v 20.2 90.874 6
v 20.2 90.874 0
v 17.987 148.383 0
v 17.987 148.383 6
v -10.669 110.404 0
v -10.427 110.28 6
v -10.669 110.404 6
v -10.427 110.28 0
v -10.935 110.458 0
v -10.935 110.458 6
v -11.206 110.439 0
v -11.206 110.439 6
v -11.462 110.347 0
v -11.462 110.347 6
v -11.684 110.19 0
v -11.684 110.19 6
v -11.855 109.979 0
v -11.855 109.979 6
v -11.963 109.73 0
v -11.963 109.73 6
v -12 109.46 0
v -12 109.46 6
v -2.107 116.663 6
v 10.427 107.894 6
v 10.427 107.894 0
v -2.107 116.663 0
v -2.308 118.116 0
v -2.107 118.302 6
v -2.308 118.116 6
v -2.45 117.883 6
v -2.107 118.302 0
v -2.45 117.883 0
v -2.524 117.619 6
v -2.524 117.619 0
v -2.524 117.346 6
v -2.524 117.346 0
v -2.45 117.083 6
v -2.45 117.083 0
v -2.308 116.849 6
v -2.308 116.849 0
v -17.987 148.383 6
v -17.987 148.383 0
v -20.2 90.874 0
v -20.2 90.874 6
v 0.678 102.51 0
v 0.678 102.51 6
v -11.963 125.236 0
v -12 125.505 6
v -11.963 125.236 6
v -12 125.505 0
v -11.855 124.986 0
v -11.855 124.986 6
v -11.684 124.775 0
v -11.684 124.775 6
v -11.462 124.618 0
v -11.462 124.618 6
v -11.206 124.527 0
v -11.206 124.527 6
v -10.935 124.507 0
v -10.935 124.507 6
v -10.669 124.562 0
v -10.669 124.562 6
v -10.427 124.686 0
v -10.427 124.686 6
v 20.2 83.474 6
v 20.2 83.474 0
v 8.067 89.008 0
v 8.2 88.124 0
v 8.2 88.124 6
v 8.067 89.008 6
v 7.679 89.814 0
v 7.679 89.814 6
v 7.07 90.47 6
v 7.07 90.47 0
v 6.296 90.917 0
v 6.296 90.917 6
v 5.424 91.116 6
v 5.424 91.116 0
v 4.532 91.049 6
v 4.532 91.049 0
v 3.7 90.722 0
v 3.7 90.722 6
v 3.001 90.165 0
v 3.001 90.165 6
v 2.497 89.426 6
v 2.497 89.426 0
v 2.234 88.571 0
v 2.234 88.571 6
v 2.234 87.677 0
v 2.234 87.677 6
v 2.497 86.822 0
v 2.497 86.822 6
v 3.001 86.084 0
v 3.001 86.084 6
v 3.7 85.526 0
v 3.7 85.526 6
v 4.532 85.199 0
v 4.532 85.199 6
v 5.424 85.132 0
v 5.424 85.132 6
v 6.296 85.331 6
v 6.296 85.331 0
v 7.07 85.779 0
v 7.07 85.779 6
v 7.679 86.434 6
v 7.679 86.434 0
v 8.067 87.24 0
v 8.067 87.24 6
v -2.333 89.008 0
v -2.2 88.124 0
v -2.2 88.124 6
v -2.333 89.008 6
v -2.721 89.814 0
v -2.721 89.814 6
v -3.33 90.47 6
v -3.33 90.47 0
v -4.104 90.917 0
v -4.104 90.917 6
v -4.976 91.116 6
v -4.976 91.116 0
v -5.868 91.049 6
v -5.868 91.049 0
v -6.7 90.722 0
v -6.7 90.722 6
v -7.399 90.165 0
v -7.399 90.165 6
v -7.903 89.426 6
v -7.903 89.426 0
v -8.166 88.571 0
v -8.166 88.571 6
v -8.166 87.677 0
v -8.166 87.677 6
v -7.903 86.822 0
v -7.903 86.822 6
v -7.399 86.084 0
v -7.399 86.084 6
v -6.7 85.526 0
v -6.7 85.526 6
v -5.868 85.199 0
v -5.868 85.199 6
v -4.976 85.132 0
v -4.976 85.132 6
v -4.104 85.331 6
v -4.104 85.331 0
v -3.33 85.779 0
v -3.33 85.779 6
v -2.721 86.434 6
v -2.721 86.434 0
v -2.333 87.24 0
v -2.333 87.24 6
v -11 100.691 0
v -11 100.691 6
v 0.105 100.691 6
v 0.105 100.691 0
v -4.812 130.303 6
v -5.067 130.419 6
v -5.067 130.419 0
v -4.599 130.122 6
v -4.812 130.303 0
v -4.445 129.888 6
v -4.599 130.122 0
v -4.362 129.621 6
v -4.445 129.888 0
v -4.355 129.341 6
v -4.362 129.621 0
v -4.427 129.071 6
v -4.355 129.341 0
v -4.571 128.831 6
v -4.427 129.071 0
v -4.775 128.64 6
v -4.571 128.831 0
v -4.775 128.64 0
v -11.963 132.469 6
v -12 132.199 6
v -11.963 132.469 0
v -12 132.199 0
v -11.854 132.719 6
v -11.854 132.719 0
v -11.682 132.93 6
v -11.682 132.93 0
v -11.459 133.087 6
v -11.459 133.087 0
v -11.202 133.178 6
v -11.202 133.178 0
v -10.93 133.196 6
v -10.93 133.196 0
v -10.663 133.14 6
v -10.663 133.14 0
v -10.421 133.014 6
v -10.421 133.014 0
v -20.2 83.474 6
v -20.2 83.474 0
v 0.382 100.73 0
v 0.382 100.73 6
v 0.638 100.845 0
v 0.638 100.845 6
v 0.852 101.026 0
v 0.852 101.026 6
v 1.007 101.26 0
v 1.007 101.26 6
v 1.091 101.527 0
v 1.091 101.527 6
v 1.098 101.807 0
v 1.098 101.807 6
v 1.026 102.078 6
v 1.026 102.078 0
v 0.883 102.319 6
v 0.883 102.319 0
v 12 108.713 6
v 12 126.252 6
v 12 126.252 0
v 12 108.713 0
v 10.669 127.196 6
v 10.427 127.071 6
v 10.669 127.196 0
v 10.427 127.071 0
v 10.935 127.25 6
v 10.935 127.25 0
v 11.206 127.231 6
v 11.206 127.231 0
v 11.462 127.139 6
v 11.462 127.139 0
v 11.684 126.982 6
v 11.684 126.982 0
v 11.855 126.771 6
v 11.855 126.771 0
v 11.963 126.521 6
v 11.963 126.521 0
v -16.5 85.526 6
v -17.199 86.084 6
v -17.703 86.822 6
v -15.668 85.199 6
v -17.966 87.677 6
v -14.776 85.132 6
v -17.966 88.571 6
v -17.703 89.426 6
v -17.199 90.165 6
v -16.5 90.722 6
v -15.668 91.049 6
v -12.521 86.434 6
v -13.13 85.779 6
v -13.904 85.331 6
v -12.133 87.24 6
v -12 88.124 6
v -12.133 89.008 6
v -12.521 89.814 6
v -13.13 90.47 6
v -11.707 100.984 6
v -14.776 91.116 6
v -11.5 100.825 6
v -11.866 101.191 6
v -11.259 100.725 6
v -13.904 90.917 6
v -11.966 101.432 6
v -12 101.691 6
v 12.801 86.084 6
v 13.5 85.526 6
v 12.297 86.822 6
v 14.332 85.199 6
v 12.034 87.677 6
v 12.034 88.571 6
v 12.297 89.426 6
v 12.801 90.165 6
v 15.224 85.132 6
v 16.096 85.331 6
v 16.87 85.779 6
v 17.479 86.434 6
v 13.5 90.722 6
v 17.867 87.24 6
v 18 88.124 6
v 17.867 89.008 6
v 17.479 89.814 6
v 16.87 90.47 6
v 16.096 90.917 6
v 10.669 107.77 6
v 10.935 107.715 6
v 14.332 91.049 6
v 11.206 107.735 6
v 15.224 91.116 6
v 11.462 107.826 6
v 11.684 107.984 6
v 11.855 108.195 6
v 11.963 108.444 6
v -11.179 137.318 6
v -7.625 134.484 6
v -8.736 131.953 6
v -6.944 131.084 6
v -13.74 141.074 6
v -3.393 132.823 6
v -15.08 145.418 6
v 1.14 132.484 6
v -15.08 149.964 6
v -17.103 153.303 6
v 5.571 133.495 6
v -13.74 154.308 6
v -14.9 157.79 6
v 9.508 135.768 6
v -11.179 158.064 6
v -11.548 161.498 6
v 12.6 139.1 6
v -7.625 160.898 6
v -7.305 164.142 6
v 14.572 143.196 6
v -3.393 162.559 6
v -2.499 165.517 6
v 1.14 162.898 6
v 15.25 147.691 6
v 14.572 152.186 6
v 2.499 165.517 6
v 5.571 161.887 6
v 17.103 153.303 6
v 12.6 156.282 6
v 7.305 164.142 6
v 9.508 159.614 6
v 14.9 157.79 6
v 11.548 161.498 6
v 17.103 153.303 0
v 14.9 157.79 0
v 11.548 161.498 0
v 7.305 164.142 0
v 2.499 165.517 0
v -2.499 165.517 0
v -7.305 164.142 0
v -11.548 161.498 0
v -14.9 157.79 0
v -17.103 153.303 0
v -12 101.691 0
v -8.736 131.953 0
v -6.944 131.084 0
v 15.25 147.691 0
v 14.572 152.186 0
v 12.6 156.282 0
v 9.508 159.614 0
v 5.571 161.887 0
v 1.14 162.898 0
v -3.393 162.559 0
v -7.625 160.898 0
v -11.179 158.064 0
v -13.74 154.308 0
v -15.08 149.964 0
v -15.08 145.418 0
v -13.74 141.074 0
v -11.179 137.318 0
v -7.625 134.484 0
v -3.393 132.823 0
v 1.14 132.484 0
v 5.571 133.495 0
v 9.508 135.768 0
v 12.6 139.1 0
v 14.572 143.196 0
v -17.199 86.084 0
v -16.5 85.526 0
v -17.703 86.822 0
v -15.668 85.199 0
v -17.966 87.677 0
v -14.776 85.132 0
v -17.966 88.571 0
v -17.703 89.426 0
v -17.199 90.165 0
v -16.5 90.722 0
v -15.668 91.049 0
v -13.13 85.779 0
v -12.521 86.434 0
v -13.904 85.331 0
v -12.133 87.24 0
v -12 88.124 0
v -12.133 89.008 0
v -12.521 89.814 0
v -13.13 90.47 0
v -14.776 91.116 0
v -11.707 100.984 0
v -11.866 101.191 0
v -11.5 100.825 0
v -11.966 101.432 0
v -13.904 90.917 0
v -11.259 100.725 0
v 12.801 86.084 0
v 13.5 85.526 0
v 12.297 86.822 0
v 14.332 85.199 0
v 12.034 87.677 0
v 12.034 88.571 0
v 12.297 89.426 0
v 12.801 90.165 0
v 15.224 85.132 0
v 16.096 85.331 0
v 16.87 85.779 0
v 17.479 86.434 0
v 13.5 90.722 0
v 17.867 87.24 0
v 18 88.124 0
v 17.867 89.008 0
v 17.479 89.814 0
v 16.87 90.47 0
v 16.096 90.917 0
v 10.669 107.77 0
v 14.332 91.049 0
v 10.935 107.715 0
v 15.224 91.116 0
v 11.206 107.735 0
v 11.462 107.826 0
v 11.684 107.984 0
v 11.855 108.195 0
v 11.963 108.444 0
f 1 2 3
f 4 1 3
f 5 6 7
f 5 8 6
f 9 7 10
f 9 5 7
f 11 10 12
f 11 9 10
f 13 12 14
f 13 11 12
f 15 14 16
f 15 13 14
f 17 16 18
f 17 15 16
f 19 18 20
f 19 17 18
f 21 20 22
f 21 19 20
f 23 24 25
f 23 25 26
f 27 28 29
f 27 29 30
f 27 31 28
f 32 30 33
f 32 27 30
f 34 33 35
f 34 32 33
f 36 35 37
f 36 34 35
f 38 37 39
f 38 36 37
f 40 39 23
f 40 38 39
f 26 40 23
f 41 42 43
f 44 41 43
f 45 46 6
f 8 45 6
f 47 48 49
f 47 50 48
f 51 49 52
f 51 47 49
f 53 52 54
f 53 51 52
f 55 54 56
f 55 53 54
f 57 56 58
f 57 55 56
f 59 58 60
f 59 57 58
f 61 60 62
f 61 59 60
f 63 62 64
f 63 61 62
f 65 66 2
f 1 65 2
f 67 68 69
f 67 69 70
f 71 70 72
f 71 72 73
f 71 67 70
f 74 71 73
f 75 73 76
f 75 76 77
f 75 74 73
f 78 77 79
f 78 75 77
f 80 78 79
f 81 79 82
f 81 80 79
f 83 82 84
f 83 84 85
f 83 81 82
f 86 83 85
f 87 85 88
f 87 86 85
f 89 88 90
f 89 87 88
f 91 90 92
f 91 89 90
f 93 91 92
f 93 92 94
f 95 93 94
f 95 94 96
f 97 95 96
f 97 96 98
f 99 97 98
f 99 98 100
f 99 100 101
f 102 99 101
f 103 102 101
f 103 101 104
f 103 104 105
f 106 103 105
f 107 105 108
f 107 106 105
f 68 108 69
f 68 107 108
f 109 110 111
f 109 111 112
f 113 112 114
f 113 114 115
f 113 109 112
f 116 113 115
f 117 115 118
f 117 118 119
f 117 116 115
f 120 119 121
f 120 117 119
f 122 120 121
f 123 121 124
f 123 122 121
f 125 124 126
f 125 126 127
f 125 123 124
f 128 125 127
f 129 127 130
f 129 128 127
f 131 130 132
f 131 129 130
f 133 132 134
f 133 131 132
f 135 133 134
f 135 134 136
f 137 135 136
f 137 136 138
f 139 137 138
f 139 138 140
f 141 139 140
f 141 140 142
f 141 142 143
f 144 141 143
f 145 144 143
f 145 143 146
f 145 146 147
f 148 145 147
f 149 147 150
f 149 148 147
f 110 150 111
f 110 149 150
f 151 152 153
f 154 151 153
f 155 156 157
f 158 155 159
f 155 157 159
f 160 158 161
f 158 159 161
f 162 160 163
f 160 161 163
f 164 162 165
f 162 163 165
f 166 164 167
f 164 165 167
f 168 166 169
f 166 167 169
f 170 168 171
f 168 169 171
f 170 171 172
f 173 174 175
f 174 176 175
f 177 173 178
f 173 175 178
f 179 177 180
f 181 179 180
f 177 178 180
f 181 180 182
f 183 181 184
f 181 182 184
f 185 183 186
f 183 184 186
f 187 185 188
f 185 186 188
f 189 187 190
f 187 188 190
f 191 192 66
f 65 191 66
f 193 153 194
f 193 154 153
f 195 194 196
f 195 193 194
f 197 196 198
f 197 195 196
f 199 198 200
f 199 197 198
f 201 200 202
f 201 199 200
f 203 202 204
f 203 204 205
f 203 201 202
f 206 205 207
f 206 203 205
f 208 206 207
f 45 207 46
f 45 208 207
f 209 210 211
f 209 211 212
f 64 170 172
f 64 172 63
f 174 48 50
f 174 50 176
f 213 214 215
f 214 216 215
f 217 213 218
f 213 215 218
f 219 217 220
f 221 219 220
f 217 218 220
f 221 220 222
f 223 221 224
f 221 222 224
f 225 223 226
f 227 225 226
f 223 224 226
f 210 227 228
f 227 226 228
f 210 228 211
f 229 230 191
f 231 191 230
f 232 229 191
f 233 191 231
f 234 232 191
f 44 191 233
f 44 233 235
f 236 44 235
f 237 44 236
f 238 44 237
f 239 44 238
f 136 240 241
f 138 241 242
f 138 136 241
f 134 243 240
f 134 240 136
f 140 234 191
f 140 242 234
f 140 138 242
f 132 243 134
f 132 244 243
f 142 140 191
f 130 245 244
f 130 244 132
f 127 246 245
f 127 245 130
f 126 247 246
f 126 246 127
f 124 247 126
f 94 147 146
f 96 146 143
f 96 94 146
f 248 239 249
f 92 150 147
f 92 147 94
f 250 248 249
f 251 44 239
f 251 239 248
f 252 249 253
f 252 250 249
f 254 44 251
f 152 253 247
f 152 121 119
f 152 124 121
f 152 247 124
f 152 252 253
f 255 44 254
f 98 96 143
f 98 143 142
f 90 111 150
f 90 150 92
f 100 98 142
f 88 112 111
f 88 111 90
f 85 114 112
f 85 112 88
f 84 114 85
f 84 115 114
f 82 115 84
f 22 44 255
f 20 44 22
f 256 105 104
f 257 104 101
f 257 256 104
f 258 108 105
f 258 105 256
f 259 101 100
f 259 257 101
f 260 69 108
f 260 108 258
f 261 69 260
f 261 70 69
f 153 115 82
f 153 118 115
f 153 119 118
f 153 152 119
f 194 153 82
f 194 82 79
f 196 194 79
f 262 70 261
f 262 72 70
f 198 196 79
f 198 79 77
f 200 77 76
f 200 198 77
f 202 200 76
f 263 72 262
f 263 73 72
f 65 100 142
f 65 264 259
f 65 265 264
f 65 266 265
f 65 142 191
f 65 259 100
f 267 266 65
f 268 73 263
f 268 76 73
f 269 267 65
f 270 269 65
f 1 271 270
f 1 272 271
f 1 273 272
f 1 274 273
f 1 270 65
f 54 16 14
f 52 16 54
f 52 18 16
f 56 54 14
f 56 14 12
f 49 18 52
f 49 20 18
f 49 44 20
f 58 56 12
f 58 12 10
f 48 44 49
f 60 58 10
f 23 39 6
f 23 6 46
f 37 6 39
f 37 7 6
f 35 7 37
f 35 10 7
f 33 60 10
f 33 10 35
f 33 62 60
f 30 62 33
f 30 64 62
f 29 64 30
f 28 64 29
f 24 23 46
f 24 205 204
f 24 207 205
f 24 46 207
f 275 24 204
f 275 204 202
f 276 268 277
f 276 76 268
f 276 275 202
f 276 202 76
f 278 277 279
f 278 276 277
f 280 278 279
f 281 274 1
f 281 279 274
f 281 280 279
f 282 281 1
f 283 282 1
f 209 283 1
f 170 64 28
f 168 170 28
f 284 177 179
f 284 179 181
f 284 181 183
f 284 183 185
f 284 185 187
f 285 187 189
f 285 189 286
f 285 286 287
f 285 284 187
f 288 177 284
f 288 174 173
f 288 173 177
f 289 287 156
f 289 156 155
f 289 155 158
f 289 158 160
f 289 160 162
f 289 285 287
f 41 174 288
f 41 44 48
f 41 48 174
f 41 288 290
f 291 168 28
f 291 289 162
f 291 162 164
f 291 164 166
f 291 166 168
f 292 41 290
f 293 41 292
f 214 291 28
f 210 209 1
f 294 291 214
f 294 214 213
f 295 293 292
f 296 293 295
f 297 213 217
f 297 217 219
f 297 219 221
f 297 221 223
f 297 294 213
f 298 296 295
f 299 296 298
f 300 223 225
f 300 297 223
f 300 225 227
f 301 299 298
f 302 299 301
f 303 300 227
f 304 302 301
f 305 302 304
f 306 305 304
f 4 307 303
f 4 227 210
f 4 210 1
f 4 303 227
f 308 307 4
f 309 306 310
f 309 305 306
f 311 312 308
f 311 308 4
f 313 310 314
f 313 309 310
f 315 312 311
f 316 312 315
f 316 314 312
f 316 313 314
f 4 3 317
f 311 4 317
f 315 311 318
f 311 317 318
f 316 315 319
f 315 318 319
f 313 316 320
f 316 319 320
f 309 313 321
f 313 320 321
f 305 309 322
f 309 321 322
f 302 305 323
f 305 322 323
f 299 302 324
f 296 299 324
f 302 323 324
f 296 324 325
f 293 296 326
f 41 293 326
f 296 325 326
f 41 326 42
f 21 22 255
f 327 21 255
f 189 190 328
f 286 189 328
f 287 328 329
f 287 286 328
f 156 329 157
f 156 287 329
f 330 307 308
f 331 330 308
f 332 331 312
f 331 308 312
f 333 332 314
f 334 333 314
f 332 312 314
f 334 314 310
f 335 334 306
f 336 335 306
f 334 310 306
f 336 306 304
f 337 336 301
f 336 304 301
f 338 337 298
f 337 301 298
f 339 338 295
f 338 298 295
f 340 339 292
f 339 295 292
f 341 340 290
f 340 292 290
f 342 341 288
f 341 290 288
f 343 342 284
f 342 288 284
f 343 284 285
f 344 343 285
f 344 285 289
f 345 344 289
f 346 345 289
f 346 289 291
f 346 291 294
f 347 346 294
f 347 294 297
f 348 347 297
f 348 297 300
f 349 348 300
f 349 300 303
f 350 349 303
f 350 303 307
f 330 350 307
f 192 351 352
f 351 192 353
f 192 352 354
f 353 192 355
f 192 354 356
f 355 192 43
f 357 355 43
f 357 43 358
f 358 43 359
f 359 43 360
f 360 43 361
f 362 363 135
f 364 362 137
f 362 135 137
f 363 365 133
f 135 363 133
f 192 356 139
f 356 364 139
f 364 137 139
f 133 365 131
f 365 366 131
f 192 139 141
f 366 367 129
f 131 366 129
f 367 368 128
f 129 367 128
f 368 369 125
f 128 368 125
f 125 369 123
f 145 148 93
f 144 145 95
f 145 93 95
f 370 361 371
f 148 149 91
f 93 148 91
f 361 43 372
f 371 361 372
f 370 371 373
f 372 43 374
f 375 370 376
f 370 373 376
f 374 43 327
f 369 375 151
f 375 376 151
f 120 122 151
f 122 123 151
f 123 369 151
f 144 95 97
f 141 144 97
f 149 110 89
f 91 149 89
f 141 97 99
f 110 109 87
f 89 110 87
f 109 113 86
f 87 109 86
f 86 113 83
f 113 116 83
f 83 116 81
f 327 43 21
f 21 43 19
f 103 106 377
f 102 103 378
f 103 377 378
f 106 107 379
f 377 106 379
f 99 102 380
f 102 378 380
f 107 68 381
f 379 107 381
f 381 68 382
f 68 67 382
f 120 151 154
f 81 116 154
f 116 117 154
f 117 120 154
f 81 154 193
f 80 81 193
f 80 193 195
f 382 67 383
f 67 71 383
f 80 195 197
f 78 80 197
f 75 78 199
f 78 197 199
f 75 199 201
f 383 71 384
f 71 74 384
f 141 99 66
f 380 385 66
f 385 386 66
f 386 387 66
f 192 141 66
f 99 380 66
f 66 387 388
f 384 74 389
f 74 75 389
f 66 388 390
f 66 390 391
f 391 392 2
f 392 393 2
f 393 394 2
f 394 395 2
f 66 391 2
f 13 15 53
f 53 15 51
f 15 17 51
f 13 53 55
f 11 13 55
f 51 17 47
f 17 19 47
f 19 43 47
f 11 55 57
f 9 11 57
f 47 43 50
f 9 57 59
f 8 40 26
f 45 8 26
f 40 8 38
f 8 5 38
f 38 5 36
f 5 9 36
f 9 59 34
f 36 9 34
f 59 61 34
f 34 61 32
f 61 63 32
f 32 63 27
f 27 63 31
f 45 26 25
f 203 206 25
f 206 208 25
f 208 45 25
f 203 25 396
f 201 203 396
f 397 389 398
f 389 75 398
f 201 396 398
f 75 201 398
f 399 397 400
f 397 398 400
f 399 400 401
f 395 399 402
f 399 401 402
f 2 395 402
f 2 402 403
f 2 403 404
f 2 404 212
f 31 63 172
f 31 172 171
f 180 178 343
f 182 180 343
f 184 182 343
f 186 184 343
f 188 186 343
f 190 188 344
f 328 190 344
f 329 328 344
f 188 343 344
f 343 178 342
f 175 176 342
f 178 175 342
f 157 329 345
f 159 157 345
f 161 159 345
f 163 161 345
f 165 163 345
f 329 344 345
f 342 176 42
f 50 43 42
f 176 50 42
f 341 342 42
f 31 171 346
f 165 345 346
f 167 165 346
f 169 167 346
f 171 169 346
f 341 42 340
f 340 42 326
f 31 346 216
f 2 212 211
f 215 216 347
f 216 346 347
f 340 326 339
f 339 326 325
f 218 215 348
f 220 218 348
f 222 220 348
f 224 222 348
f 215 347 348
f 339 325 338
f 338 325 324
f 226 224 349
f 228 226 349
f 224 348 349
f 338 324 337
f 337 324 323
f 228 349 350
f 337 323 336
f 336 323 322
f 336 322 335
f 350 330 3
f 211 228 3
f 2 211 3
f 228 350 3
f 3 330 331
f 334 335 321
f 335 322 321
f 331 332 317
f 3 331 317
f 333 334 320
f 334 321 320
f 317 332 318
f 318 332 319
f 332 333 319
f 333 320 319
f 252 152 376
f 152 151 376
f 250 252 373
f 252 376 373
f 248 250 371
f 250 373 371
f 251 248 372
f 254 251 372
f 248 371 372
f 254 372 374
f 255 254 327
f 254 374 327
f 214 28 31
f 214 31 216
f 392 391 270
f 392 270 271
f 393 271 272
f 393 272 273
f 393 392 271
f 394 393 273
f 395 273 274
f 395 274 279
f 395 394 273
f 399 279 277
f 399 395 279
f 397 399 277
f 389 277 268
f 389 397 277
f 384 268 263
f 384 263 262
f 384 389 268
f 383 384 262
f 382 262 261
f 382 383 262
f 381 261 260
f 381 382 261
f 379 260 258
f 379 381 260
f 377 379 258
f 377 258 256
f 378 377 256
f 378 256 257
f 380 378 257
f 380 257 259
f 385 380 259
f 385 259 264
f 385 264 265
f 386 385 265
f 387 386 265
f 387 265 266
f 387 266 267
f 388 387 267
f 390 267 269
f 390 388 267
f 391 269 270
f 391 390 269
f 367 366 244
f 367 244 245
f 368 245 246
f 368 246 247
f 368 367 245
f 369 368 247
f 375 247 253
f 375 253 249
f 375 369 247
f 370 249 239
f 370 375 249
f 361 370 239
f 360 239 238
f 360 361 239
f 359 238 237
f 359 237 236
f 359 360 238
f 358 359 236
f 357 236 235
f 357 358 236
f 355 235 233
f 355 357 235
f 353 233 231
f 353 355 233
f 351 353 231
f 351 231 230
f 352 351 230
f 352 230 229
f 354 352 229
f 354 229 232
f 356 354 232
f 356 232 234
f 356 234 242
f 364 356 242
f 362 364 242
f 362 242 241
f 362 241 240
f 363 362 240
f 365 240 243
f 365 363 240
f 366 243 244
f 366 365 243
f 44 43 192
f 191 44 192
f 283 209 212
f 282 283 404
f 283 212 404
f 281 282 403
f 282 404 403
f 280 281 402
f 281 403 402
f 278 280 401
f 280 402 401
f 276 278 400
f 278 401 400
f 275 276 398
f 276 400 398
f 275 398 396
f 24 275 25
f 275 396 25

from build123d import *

# Parameters (mm, degrees)
SKETCH1_R               = 3
SKETCH1_R_2             = 7.95
MAIN_BODY_LINK_B1_DEPTH = 6
CUT_EXTRUDE1_REACH      = 169.025
CUT_EXTRUDE2_REACH      = 169.025
SKETCH3_R               = 1.5
FILLET1_R               = 1
SKETCH4_R               = 15.25
CUT_EXTRUDE3_DEPTH      = 168.02546447


with BuildPart() as part:
    # Sketch1 → Main Body Link B1 (new body)
    with BuildSketch(Plane.XY):
        with BuildLine():
            Line((-11.1, 83.474052381), (-9.1, 83.474052381))
            Line((-9.1, 83.474052381), (0, 83.474052381))
            Line((0, 83.474052381), (9.1, 83.474052381))
            Line((9.1, 83.474052381), (11.1, 83.474052381))
            Line((11.1, 83.474052381), (20.2, 83.474052381))
            Line((20.2, 83.474052381), (20.2, 90.874052381))
            Line((20.2, 90.874052381), (17.986683974, 148.383116621))
            ThreePointArc((17.986683974, 148.383116621), (0, 165.690874165), (-17.986683974, 148.383116621))
            Line((-17.986683974, 148.383116621), (-20.2, 90.874052381))
            Line((-20.2, 90.874052381), (-20.2, 83.474052381))
            Line((-20.2, 83.474052381), (-11.1, 83.474052381))
        make_face()
        with Locations((5.2, 88.124052381)):
            Circle(SKETCH1_R, mode=Mode.SUBTRACT)
        with Locations((15, 88.124052381)):
            Circle(SKETCH1_R, mode=Mode.SUBTRACT)
        with Locations((-15, 88.124052381)):
            Circle(SKETCH1_R, mode=Mode.SUBTRACT)
        with Locations((-5.2, 88.124052381)):
            Circle(SKETCH1_R, mode=Mode.SUBTRACT)
        with Locations((0, 147.690874165)):
            Circle(SKETCH1_R_2, mode=Mode.SUBTRACT)
    extrude(amount=MAIN_BODY_LINK_B1_DEPTH)

    # Sketch2 → Cut-Extrude1 (cut, up to next)
    with BuildSketch(Plane.XY.offset(6), mode=Mode.PRIVATE) as cut_extrude1_sk1:
        with BuildLine():
            ThreePointArc((-2.929911079, 129.930929878), (-7.774454217, 131.456408925), (-12, 134.2744663))
            Line((-12, 134.2744663), (-12, 123.584968066))
            Line((-12, 123.584968066), (-2.929911079, 129.930929878))
        make_face()
    cut_extrude1_tool1 = extrude(cut_extrude1_sk1.sketch, amount=-CUT_EXTRUDE1_REACH, mode=Mode.PRIVATE) & part.part
    # Sketch2 → Cut-Extrude1 (cut, up to next)
    with BuildSketch(Plane.XY.offset(6), mode=Mode.PRIVATE) as cut_extrude1_sk2:
        Polygon((-12, 111.380372399), (-12, 100.690874165), (3.278172542, 100.690874165), align=None)
    cut_extrude1_tool2 = extrude(cut_extrude1_sk2.sketch, amount=-CUT_EXTRUDE1_REACH, mode=Mode.PRIVATE) & part.part
    # Sketch2 → Cut-Extrude1 (cut, up to next)
    with BuildSketch(Plane.XY.offset(6), mode=Mode.PRIVATE) as cut_extrude1_sk3:
        Polygon((12, 106.793171999), (12, 128.172168466), (-3.278172542, 117.482670232), align=None)
    cut_extrude1_tool3 = extrude(cut_extrude1_sk3.sketch, amount=-CUT_EXTRUDE1_REACH, mode=Mode.PRIVATE) & part.part
    add(cut_extrude1_tool1.solids().sort_by_distance((-9.12997, 128.978342, 6))[0], mode=Mode.SUBTRACT)
    add(cut_extrude1_tool2.solids().sort_by_distance((-6.907276, 104.25404, 6))[0], mode=Mode.SUBTRACT)
    add(cut_extrude1_tool3.solids().sort_by_distance((6.907276, 117.48267, 6))[0], mode=Mode.SUBTRACT)

    # Sketch3 → Cut-Extrude2 (cut, up to next)
    with BuildSketch(Plane.XY.offset(6), mode=Mode.PRIVATE) as cut_extrude2_sk1:
        with Locations((-11.5, 147.690874165)):
            Circle(SKETCH3_R)
    cut_extrude2_tool1 = extrude(cut_extrude2_sk1.sketch, amount=-CUT_EXTRUDE2_REACH, mode=Mode.PRIVATE) & part.part
    # Sketch3 → Cut-Extrude2 (cut, up to next)
    with BuildSketch(Plane.XY.offset(6), mode=Mode.PRIVATE) as cut_extrude2_sk2:
        with Locations((11.5, 147.690874165)):
            Circle(SKETCH3_R)
    cut_extrude2_tool2 = extrude(cut_extrude2_sk2.sketch, amount=-CUT_EXTRUDE2_REACH, mode=Mode.PRIVATE) & part.part
    add(cut_extrude2_tool1.solids().sort_by_distance((-11.5, 147.690874, 6))[0], mode=Mode.SUBTRACT)
    add(cut_extrude2_tool2.solids().sort_by_distance((11.5, 147.690874, 6))[0], mode=Mode.SUBTRACT)

    # Fillet1
    fillet1_edges = [part.edges().sort_by_distance(p)[0] for p in [
        (-12, 100.690874165, 3),
        (3.278172542, 100.690874165, 3),
        (-12, 111.380372399, 3),
        (12, 106.793171999, 3),
        (12, 128.172168466, 3),
        (-3.278172542, 117.482670232, 3),
        (-12, 123.584968066, 3),
        (-2.929911079, 129.930929878, 3),
        (-12, 134.2744663, 3),
    ]]
    fillet(fillet1_edges, radius=FILLET1_R)

    # Sketch4 → Cut-Extrude3 (cut, through all)
    with BuildSketch(Plane.XY.offset(6)):
        with Locations((0, 147.690874165)):
            Circle(SKETCH4_R)
    extrude(amount=-CUT_EXTRUDE3_DEPTH, mode=Mode.SUBTRACT)


solid = part.part
